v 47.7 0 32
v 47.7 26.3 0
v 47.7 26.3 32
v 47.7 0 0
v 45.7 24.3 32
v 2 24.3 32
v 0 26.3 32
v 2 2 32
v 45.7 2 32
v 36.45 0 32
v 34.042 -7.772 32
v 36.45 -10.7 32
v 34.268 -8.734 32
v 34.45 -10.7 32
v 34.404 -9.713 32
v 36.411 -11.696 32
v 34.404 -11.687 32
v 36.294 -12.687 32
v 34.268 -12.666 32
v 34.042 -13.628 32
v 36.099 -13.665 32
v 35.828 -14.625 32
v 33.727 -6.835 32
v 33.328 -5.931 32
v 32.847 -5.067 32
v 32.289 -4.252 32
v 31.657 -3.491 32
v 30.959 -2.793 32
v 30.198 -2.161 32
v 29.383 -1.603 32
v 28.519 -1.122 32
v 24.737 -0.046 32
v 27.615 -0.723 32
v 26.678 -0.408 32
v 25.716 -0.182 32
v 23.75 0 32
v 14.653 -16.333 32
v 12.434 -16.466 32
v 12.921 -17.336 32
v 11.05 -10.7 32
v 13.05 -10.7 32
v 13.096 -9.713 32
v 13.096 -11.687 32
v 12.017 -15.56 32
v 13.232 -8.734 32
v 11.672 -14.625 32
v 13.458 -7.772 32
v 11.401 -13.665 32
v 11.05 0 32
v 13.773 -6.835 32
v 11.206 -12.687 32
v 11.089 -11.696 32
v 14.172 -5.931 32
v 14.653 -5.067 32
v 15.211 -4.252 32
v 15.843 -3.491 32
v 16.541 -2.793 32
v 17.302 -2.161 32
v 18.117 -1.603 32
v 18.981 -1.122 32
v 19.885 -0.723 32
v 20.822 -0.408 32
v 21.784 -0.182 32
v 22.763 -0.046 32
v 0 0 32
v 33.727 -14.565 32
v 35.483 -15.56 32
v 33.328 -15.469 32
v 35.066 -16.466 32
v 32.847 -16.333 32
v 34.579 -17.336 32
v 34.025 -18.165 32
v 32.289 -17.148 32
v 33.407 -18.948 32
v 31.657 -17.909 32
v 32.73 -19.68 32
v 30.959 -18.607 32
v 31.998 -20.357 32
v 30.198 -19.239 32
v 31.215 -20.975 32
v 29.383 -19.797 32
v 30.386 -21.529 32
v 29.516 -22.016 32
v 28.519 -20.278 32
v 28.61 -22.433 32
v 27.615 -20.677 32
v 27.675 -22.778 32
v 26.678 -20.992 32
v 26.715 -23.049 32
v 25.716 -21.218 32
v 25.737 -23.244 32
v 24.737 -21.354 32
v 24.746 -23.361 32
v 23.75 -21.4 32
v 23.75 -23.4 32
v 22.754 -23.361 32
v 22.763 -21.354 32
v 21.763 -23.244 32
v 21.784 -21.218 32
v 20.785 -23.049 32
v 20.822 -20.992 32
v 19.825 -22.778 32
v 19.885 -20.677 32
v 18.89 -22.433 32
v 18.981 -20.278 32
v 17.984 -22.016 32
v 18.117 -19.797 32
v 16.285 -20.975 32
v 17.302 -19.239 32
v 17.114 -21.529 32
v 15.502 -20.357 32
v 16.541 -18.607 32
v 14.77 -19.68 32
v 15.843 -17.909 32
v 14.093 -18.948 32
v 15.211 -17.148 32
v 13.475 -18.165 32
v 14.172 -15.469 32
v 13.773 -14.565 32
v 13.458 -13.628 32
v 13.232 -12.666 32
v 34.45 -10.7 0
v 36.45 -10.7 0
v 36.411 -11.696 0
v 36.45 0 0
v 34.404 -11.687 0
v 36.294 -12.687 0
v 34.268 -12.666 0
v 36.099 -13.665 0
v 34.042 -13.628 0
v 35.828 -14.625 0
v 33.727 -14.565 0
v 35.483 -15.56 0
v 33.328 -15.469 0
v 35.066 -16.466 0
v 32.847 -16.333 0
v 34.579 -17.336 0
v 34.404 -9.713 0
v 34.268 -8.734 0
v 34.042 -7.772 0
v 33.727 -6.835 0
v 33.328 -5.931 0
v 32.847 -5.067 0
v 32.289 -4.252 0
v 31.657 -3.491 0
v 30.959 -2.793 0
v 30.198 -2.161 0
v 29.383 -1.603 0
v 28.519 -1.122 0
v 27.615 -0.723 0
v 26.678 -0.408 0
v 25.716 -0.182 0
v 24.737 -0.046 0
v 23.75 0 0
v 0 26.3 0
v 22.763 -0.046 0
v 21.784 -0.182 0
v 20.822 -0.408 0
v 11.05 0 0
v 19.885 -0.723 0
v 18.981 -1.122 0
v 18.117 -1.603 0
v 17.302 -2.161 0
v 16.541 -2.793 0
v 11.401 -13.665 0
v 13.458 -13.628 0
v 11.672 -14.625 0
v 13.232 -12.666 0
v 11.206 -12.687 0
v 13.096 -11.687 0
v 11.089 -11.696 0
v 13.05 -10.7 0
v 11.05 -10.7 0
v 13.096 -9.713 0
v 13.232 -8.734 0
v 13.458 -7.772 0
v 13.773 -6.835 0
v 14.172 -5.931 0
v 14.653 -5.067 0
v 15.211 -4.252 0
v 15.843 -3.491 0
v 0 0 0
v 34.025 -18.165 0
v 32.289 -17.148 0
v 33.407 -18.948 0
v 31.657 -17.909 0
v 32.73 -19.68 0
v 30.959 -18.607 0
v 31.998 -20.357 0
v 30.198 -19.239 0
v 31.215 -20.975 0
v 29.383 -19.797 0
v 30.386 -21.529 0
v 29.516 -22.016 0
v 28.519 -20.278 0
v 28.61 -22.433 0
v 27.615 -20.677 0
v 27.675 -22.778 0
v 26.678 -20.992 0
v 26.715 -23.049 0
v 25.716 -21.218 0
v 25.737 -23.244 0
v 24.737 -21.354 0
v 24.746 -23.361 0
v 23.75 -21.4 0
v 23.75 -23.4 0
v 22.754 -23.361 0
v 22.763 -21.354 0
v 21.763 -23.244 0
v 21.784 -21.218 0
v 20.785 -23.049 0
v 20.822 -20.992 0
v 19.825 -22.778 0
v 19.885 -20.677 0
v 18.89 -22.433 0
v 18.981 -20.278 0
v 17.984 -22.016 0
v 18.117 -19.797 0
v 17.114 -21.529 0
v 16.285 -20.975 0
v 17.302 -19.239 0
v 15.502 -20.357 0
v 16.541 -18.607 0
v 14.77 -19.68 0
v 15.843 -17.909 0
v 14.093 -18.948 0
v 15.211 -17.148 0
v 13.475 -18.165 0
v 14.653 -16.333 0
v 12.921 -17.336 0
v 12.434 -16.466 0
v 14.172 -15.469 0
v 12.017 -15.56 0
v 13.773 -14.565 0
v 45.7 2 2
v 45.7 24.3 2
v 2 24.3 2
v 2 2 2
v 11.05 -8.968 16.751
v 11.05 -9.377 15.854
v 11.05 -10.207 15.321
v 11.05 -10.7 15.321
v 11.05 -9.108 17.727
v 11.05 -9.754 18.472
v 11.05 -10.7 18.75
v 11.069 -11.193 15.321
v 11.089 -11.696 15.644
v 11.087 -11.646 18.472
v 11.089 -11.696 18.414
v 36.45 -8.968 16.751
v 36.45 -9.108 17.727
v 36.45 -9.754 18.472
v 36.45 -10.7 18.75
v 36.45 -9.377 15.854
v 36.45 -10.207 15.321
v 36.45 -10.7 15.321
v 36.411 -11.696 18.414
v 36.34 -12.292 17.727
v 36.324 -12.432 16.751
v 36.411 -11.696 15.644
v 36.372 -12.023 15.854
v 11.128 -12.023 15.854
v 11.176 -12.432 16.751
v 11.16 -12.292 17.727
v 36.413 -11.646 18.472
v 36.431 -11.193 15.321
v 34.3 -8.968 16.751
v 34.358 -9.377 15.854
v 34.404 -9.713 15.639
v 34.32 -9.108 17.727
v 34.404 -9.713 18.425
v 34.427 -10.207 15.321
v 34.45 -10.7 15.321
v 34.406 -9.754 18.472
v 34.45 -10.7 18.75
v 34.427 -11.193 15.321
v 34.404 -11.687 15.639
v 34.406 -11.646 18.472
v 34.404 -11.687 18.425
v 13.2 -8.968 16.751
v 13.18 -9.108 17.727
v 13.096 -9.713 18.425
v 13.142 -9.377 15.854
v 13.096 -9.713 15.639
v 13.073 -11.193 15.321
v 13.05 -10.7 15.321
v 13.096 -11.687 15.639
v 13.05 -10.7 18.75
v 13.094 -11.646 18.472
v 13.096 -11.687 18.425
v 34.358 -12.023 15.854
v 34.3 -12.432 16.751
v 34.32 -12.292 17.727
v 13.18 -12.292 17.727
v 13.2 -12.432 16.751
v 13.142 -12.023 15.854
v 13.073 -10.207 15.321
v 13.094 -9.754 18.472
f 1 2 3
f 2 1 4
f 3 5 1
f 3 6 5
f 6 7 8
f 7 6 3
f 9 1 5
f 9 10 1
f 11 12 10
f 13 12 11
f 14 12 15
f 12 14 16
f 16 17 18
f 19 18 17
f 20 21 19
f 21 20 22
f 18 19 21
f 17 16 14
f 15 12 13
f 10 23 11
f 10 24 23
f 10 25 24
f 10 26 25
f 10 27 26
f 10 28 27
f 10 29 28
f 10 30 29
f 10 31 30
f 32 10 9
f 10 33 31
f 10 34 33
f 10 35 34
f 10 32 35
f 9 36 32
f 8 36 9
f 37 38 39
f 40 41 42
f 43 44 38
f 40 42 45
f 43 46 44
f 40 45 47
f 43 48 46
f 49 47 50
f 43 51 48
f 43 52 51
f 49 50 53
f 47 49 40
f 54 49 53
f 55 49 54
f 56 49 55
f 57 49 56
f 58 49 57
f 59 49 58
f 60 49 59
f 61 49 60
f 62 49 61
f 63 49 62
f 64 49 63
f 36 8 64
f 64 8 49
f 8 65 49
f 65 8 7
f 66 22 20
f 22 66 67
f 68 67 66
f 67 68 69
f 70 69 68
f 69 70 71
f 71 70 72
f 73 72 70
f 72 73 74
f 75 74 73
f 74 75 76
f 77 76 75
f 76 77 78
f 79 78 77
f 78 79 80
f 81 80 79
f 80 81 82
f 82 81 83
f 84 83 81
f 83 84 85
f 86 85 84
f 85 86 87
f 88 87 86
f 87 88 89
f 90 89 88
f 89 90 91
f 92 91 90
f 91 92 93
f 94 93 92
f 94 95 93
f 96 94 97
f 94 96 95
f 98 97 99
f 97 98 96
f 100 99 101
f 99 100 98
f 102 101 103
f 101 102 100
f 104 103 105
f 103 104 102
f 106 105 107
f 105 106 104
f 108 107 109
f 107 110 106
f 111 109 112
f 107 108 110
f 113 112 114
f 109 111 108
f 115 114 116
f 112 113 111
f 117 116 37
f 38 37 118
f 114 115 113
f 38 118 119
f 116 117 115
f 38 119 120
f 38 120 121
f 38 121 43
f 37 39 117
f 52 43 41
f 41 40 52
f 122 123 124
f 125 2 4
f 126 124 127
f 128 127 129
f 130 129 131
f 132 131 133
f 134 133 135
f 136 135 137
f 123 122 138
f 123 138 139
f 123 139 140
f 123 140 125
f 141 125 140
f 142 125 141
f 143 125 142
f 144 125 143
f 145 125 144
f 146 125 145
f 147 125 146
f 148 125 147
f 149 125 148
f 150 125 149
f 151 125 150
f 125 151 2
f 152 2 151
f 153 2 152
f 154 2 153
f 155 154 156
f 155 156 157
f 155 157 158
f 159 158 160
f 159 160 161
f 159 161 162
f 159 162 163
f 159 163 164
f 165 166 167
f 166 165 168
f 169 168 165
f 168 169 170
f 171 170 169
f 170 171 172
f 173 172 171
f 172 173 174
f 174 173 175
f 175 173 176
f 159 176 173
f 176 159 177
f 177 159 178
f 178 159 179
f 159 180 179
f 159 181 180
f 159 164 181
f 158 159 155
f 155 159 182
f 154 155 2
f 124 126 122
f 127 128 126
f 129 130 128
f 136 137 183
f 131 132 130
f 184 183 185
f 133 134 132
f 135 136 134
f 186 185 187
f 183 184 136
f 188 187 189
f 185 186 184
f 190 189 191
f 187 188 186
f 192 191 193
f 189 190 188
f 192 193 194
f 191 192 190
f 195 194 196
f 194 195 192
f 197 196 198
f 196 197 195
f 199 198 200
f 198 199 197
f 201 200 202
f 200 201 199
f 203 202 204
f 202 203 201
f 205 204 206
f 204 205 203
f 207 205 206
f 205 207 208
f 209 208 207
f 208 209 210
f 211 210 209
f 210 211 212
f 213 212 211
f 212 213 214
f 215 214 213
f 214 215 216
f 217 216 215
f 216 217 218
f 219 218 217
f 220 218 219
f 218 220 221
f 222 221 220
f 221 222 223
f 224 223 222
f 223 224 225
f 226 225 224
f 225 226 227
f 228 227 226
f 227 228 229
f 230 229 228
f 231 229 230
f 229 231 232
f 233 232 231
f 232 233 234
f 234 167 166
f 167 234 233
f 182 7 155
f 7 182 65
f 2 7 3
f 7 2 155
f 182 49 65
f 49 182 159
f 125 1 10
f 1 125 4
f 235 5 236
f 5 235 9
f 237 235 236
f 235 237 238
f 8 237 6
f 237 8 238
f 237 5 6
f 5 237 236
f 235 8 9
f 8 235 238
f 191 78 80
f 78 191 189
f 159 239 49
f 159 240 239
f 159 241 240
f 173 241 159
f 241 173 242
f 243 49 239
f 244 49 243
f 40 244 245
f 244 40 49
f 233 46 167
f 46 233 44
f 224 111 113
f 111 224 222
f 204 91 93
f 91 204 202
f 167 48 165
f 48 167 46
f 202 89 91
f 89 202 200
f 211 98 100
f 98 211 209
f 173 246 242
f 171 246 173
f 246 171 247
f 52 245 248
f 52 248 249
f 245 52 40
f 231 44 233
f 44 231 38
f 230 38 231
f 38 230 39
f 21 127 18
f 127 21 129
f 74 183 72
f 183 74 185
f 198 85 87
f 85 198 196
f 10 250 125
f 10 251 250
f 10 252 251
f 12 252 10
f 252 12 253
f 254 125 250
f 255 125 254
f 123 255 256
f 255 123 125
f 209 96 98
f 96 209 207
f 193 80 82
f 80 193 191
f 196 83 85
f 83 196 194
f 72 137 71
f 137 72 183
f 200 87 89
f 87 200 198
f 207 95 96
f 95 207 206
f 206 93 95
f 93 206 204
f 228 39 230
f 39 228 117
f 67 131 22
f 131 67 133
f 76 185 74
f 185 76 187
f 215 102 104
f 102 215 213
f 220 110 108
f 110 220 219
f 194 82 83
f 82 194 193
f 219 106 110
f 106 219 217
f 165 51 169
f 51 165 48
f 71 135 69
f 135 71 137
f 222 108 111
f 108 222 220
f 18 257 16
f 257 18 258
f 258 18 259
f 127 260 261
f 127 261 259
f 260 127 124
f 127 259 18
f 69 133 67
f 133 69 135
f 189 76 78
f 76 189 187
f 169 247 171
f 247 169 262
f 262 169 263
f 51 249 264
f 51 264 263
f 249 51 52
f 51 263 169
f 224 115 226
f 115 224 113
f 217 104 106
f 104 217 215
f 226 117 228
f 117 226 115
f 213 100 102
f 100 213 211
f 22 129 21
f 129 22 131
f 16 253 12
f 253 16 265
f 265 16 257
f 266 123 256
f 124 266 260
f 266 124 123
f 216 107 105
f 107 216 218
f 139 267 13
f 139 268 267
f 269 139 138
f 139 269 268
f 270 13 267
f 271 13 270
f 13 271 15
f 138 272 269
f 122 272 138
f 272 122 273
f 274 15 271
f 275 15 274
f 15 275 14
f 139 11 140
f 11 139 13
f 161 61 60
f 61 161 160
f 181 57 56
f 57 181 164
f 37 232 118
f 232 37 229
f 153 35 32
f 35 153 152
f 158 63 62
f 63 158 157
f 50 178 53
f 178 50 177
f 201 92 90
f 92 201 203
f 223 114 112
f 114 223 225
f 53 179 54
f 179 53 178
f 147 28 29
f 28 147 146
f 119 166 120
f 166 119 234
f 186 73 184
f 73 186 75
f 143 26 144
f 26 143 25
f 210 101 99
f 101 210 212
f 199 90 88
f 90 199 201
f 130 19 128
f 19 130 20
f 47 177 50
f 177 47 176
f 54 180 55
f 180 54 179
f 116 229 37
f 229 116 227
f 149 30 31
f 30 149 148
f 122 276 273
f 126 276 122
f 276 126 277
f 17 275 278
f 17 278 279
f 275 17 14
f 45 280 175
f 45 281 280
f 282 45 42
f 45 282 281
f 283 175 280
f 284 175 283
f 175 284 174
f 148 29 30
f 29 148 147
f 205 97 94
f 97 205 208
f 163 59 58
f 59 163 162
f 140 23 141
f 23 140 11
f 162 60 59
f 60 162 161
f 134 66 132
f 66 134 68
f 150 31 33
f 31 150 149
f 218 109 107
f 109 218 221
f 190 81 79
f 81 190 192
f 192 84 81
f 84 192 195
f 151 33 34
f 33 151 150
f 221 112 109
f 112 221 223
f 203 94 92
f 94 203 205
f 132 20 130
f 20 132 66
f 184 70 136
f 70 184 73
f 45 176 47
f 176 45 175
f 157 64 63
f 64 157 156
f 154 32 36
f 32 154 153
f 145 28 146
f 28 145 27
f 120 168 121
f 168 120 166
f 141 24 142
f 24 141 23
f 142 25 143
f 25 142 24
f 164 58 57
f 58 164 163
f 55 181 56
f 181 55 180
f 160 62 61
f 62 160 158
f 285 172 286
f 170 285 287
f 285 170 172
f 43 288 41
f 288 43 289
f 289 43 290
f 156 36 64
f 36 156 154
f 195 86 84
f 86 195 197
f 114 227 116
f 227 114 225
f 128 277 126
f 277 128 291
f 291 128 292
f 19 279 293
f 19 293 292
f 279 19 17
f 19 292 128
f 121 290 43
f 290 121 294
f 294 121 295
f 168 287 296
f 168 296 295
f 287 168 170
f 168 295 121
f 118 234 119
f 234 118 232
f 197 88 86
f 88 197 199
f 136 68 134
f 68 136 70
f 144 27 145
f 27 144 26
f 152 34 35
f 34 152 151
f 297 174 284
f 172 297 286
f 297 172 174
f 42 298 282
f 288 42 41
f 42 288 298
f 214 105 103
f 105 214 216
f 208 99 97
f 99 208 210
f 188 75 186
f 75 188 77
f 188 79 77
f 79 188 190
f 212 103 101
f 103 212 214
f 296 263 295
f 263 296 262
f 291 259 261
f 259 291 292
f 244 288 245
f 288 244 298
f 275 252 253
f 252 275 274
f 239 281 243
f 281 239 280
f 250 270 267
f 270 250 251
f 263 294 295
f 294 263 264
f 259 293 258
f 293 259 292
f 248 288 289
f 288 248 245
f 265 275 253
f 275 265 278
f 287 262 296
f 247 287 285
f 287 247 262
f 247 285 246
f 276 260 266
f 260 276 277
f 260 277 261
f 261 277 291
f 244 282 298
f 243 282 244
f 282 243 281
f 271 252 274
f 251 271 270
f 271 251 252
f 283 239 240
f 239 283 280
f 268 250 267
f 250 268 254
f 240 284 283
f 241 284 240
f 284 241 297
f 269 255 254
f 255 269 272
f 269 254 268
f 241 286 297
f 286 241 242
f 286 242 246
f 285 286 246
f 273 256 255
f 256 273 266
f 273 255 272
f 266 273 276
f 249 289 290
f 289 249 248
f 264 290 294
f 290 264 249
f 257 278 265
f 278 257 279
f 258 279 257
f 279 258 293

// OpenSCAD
$fa = 1;
$fs = 1;
mm = 1;
eps = 0.1 * mm;

battery_size = [ 43.5, 22.1, 97.0 ] * mm;

cup_height = 30 * mm;
cup_margin = 0.1 * mm;
wall_thickness = 2 * mm;

pipe_dia = 21.4 * mm;
key_dia = 3.5 * mm;

module cup()
{
    difference()
    {
        cube([
            battery_size.x + 2 * (cup_margin + wall_thickness),
            battery_size.y + 2 * (cup_margin + wall_thickness),
            cup_height + wall_thickness,
        ]);
        translate([ wall_thickness, wall_thickness, wall_thickness ]) cube([
            battery_size.x + 2 * cup_margin,
            battery_size.y + 2 * cup_margin,
            cup_height + eps,
        ]);
    }
}

module mount()
{
    difference()
    {
        hull()
        {
            cylinder(d = pipe_dia + 2 * wall_thickness, h = cup_height + wall_thickness);
            translate([ -0.5 * pipe_dia - wall_thickness, 0.5 * pipe_dia, 0 ]) cube([
                pipe_dia + 2 * wall_thickness,
                wall_thickness - eps,
                cup_height + wall_thickness,
            ]);
        }
        translate([ 0, 0, -eps ]) cylinder(d = pipe_dia, h = cup_height + wall_thickness + 2 * eps);

        translate([ 0.5 * pipe_dia + wall_thickness + 0.1 * mm, 0, wall_thickness + 0.5 * cup_height ])
            rotate([ 0, -90, 0 ]) cylinder(d = key_dia, h = pipe_dia * 2 + wall_thickness + 0.2 * mm);
    }
}

module battery_holder()
{
    cup();
    translate([ 0.5 * battery_size.x + wall_thickness, -0.5 * (pipe_dia), 0 ]) mount();
}

battery_holder();
